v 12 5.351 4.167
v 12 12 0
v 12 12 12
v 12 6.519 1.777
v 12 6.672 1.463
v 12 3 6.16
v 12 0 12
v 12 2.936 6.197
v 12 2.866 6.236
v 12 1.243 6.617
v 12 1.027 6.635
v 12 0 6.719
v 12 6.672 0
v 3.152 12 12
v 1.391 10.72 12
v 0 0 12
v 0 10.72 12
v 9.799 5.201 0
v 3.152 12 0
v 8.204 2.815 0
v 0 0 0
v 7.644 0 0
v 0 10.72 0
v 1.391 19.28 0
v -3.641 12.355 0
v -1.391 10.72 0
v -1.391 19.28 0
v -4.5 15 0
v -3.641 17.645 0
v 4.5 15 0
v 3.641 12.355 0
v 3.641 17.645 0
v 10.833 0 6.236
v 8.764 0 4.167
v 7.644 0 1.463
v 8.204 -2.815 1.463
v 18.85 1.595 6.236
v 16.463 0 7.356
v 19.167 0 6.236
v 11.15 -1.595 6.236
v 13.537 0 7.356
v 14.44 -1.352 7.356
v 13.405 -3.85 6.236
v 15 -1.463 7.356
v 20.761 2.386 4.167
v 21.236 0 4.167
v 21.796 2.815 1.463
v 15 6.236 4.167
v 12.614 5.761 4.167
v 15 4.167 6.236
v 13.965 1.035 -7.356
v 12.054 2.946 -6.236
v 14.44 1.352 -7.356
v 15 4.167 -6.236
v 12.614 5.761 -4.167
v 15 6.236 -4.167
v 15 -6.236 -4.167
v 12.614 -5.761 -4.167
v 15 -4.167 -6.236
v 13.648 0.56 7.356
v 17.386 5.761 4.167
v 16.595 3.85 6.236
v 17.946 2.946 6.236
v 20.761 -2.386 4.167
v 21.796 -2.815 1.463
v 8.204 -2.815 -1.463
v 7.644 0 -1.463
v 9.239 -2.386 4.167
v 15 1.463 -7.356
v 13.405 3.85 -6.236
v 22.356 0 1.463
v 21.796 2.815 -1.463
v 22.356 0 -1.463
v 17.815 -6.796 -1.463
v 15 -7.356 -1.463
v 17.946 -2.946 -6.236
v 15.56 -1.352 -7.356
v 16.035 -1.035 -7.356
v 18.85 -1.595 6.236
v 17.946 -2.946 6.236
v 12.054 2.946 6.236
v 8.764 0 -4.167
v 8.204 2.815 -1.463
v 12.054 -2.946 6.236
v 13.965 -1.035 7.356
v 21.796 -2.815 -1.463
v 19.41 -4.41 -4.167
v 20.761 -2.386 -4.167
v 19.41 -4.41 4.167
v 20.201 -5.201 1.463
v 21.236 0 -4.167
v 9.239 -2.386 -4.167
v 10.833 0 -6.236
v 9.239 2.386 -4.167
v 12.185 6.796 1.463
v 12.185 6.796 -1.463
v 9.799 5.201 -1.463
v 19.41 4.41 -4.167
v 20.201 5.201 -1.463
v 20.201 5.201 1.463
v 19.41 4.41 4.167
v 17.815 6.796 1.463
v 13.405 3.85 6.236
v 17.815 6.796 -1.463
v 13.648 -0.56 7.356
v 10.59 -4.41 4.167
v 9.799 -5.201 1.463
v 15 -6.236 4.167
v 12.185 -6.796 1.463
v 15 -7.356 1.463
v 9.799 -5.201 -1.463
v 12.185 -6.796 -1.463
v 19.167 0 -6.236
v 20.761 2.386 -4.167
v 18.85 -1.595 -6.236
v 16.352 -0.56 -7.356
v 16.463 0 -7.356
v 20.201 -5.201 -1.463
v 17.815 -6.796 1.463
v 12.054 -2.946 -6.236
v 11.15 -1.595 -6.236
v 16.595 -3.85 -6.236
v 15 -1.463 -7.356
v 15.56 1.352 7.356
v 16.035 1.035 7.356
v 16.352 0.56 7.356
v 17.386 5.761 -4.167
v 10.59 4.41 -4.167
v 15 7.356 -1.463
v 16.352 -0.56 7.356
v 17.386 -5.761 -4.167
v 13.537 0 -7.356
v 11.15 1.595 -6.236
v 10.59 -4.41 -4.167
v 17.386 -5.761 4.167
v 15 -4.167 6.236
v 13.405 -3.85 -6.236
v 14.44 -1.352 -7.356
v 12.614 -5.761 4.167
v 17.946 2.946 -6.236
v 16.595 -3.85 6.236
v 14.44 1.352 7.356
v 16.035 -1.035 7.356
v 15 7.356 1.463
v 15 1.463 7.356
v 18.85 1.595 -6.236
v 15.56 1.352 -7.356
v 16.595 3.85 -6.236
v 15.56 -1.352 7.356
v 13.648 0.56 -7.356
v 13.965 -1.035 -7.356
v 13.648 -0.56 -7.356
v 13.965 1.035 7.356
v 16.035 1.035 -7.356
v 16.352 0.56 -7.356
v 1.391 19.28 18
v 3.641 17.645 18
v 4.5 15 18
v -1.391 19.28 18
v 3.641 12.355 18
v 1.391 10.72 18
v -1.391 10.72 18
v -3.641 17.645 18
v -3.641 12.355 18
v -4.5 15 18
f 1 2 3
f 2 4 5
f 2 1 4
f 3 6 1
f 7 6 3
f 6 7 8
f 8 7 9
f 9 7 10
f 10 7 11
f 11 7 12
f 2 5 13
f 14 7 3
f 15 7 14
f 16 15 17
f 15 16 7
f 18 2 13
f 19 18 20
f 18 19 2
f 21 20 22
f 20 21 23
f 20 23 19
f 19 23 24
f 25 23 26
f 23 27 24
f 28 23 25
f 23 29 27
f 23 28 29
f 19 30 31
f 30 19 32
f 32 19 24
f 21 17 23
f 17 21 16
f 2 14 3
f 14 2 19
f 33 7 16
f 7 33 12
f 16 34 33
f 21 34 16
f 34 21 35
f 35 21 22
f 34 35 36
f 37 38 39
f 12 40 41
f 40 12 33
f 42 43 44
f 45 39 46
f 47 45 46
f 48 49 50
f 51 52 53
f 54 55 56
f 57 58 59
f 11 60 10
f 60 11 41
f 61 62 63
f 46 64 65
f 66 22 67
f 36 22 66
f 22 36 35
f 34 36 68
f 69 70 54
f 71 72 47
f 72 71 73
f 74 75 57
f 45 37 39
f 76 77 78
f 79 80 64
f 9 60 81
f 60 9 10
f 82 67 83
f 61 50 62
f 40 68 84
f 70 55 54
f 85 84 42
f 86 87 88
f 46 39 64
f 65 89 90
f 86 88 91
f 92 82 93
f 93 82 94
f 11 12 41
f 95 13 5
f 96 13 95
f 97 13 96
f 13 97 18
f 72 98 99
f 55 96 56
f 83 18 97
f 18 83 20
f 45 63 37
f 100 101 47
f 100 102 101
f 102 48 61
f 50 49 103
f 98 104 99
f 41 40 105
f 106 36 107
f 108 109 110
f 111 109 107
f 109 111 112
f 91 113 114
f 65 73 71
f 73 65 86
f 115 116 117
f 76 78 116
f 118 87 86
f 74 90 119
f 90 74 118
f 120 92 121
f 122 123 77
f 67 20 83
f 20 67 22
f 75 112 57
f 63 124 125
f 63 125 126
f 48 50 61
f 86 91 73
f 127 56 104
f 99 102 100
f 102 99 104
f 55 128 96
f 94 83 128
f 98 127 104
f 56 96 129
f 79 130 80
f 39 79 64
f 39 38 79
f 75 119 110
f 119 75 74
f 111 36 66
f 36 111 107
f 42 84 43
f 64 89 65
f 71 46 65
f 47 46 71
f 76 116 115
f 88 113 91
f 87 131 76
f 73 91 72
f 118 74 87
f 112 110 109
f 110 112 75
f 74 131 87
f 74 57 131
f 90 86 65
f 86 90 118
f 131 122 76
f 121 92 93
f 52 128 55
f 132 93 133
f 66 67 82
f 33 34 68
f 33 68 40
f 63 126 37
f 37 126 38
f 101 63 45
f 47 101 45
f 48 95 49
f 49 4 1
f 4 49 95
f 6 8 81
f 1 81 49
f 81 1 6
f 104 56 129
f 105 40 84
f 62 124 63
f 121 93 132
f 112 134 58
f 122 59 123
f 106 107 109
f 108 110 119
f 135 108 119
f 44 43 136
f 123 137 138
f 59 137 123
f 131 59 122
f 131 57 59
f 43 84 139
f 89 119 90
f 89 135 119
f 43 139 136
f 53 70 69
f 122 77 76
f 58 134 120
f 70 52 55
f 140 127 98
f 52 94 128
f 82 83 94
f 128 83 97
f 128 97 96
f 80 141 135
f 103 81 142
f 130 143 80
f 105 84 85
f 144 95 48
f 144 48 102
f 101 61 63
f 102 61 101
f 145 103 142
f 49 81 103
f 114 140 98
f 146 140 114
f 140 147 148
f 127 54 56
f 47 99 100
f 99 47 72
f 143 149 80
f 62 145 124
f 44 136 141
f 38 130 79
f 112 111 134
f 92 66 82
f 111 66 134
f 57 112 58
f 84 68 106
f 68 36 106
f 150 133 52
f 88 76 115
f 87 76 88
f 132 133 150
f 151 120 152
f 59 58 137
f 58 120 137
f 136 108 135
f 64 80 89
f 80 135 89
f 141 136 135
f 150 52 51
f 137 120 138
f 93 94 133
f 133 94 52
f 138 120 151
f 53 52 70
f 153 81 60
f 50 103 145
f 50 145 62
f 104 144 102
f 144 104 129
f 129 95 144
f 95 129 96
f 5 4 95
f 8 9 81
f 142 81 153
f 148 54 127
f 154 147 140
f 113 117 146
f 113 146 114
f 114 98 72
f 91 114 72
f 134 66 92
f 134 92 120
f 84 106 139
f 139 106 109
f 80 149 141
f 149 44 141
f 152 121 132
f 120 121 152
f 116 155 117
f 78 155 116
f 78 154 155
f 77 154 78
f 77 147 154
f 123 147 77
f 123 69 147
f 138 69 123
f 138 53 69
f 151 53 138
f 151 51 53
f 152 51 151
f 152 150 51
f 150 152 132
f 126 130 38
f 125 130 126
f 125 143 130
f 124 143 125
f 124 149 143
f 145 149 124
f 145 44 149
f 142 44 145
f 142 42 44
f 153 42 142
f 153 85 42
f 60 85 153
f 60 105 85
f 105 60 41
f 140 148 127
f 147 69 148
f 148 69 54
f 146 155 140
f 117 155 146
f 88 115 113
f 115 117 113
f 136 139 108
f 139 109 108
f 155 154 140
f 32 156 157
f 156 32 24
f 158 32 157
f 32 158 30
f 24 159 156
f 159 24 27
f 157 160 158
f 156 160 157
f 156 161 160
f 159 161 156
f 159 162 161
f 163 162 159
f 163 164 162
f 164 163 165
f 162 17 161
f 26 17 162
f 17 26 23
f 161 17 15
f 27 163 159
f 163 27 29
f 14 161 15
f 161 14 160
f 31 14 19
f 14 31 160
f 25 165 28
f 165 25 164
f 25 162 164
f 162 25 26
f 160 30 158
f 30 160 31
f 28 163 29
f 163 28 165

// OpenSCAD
scale([1.5, 1.5, 1.5]) union() {
    translate([0, 0, 0]) cube([8, 8, 8]);
    translate([10, 0, 0]) sphere(r = 5);
    translate([0, 10, 0]) cylinder(h = 12, r = 3);
}
